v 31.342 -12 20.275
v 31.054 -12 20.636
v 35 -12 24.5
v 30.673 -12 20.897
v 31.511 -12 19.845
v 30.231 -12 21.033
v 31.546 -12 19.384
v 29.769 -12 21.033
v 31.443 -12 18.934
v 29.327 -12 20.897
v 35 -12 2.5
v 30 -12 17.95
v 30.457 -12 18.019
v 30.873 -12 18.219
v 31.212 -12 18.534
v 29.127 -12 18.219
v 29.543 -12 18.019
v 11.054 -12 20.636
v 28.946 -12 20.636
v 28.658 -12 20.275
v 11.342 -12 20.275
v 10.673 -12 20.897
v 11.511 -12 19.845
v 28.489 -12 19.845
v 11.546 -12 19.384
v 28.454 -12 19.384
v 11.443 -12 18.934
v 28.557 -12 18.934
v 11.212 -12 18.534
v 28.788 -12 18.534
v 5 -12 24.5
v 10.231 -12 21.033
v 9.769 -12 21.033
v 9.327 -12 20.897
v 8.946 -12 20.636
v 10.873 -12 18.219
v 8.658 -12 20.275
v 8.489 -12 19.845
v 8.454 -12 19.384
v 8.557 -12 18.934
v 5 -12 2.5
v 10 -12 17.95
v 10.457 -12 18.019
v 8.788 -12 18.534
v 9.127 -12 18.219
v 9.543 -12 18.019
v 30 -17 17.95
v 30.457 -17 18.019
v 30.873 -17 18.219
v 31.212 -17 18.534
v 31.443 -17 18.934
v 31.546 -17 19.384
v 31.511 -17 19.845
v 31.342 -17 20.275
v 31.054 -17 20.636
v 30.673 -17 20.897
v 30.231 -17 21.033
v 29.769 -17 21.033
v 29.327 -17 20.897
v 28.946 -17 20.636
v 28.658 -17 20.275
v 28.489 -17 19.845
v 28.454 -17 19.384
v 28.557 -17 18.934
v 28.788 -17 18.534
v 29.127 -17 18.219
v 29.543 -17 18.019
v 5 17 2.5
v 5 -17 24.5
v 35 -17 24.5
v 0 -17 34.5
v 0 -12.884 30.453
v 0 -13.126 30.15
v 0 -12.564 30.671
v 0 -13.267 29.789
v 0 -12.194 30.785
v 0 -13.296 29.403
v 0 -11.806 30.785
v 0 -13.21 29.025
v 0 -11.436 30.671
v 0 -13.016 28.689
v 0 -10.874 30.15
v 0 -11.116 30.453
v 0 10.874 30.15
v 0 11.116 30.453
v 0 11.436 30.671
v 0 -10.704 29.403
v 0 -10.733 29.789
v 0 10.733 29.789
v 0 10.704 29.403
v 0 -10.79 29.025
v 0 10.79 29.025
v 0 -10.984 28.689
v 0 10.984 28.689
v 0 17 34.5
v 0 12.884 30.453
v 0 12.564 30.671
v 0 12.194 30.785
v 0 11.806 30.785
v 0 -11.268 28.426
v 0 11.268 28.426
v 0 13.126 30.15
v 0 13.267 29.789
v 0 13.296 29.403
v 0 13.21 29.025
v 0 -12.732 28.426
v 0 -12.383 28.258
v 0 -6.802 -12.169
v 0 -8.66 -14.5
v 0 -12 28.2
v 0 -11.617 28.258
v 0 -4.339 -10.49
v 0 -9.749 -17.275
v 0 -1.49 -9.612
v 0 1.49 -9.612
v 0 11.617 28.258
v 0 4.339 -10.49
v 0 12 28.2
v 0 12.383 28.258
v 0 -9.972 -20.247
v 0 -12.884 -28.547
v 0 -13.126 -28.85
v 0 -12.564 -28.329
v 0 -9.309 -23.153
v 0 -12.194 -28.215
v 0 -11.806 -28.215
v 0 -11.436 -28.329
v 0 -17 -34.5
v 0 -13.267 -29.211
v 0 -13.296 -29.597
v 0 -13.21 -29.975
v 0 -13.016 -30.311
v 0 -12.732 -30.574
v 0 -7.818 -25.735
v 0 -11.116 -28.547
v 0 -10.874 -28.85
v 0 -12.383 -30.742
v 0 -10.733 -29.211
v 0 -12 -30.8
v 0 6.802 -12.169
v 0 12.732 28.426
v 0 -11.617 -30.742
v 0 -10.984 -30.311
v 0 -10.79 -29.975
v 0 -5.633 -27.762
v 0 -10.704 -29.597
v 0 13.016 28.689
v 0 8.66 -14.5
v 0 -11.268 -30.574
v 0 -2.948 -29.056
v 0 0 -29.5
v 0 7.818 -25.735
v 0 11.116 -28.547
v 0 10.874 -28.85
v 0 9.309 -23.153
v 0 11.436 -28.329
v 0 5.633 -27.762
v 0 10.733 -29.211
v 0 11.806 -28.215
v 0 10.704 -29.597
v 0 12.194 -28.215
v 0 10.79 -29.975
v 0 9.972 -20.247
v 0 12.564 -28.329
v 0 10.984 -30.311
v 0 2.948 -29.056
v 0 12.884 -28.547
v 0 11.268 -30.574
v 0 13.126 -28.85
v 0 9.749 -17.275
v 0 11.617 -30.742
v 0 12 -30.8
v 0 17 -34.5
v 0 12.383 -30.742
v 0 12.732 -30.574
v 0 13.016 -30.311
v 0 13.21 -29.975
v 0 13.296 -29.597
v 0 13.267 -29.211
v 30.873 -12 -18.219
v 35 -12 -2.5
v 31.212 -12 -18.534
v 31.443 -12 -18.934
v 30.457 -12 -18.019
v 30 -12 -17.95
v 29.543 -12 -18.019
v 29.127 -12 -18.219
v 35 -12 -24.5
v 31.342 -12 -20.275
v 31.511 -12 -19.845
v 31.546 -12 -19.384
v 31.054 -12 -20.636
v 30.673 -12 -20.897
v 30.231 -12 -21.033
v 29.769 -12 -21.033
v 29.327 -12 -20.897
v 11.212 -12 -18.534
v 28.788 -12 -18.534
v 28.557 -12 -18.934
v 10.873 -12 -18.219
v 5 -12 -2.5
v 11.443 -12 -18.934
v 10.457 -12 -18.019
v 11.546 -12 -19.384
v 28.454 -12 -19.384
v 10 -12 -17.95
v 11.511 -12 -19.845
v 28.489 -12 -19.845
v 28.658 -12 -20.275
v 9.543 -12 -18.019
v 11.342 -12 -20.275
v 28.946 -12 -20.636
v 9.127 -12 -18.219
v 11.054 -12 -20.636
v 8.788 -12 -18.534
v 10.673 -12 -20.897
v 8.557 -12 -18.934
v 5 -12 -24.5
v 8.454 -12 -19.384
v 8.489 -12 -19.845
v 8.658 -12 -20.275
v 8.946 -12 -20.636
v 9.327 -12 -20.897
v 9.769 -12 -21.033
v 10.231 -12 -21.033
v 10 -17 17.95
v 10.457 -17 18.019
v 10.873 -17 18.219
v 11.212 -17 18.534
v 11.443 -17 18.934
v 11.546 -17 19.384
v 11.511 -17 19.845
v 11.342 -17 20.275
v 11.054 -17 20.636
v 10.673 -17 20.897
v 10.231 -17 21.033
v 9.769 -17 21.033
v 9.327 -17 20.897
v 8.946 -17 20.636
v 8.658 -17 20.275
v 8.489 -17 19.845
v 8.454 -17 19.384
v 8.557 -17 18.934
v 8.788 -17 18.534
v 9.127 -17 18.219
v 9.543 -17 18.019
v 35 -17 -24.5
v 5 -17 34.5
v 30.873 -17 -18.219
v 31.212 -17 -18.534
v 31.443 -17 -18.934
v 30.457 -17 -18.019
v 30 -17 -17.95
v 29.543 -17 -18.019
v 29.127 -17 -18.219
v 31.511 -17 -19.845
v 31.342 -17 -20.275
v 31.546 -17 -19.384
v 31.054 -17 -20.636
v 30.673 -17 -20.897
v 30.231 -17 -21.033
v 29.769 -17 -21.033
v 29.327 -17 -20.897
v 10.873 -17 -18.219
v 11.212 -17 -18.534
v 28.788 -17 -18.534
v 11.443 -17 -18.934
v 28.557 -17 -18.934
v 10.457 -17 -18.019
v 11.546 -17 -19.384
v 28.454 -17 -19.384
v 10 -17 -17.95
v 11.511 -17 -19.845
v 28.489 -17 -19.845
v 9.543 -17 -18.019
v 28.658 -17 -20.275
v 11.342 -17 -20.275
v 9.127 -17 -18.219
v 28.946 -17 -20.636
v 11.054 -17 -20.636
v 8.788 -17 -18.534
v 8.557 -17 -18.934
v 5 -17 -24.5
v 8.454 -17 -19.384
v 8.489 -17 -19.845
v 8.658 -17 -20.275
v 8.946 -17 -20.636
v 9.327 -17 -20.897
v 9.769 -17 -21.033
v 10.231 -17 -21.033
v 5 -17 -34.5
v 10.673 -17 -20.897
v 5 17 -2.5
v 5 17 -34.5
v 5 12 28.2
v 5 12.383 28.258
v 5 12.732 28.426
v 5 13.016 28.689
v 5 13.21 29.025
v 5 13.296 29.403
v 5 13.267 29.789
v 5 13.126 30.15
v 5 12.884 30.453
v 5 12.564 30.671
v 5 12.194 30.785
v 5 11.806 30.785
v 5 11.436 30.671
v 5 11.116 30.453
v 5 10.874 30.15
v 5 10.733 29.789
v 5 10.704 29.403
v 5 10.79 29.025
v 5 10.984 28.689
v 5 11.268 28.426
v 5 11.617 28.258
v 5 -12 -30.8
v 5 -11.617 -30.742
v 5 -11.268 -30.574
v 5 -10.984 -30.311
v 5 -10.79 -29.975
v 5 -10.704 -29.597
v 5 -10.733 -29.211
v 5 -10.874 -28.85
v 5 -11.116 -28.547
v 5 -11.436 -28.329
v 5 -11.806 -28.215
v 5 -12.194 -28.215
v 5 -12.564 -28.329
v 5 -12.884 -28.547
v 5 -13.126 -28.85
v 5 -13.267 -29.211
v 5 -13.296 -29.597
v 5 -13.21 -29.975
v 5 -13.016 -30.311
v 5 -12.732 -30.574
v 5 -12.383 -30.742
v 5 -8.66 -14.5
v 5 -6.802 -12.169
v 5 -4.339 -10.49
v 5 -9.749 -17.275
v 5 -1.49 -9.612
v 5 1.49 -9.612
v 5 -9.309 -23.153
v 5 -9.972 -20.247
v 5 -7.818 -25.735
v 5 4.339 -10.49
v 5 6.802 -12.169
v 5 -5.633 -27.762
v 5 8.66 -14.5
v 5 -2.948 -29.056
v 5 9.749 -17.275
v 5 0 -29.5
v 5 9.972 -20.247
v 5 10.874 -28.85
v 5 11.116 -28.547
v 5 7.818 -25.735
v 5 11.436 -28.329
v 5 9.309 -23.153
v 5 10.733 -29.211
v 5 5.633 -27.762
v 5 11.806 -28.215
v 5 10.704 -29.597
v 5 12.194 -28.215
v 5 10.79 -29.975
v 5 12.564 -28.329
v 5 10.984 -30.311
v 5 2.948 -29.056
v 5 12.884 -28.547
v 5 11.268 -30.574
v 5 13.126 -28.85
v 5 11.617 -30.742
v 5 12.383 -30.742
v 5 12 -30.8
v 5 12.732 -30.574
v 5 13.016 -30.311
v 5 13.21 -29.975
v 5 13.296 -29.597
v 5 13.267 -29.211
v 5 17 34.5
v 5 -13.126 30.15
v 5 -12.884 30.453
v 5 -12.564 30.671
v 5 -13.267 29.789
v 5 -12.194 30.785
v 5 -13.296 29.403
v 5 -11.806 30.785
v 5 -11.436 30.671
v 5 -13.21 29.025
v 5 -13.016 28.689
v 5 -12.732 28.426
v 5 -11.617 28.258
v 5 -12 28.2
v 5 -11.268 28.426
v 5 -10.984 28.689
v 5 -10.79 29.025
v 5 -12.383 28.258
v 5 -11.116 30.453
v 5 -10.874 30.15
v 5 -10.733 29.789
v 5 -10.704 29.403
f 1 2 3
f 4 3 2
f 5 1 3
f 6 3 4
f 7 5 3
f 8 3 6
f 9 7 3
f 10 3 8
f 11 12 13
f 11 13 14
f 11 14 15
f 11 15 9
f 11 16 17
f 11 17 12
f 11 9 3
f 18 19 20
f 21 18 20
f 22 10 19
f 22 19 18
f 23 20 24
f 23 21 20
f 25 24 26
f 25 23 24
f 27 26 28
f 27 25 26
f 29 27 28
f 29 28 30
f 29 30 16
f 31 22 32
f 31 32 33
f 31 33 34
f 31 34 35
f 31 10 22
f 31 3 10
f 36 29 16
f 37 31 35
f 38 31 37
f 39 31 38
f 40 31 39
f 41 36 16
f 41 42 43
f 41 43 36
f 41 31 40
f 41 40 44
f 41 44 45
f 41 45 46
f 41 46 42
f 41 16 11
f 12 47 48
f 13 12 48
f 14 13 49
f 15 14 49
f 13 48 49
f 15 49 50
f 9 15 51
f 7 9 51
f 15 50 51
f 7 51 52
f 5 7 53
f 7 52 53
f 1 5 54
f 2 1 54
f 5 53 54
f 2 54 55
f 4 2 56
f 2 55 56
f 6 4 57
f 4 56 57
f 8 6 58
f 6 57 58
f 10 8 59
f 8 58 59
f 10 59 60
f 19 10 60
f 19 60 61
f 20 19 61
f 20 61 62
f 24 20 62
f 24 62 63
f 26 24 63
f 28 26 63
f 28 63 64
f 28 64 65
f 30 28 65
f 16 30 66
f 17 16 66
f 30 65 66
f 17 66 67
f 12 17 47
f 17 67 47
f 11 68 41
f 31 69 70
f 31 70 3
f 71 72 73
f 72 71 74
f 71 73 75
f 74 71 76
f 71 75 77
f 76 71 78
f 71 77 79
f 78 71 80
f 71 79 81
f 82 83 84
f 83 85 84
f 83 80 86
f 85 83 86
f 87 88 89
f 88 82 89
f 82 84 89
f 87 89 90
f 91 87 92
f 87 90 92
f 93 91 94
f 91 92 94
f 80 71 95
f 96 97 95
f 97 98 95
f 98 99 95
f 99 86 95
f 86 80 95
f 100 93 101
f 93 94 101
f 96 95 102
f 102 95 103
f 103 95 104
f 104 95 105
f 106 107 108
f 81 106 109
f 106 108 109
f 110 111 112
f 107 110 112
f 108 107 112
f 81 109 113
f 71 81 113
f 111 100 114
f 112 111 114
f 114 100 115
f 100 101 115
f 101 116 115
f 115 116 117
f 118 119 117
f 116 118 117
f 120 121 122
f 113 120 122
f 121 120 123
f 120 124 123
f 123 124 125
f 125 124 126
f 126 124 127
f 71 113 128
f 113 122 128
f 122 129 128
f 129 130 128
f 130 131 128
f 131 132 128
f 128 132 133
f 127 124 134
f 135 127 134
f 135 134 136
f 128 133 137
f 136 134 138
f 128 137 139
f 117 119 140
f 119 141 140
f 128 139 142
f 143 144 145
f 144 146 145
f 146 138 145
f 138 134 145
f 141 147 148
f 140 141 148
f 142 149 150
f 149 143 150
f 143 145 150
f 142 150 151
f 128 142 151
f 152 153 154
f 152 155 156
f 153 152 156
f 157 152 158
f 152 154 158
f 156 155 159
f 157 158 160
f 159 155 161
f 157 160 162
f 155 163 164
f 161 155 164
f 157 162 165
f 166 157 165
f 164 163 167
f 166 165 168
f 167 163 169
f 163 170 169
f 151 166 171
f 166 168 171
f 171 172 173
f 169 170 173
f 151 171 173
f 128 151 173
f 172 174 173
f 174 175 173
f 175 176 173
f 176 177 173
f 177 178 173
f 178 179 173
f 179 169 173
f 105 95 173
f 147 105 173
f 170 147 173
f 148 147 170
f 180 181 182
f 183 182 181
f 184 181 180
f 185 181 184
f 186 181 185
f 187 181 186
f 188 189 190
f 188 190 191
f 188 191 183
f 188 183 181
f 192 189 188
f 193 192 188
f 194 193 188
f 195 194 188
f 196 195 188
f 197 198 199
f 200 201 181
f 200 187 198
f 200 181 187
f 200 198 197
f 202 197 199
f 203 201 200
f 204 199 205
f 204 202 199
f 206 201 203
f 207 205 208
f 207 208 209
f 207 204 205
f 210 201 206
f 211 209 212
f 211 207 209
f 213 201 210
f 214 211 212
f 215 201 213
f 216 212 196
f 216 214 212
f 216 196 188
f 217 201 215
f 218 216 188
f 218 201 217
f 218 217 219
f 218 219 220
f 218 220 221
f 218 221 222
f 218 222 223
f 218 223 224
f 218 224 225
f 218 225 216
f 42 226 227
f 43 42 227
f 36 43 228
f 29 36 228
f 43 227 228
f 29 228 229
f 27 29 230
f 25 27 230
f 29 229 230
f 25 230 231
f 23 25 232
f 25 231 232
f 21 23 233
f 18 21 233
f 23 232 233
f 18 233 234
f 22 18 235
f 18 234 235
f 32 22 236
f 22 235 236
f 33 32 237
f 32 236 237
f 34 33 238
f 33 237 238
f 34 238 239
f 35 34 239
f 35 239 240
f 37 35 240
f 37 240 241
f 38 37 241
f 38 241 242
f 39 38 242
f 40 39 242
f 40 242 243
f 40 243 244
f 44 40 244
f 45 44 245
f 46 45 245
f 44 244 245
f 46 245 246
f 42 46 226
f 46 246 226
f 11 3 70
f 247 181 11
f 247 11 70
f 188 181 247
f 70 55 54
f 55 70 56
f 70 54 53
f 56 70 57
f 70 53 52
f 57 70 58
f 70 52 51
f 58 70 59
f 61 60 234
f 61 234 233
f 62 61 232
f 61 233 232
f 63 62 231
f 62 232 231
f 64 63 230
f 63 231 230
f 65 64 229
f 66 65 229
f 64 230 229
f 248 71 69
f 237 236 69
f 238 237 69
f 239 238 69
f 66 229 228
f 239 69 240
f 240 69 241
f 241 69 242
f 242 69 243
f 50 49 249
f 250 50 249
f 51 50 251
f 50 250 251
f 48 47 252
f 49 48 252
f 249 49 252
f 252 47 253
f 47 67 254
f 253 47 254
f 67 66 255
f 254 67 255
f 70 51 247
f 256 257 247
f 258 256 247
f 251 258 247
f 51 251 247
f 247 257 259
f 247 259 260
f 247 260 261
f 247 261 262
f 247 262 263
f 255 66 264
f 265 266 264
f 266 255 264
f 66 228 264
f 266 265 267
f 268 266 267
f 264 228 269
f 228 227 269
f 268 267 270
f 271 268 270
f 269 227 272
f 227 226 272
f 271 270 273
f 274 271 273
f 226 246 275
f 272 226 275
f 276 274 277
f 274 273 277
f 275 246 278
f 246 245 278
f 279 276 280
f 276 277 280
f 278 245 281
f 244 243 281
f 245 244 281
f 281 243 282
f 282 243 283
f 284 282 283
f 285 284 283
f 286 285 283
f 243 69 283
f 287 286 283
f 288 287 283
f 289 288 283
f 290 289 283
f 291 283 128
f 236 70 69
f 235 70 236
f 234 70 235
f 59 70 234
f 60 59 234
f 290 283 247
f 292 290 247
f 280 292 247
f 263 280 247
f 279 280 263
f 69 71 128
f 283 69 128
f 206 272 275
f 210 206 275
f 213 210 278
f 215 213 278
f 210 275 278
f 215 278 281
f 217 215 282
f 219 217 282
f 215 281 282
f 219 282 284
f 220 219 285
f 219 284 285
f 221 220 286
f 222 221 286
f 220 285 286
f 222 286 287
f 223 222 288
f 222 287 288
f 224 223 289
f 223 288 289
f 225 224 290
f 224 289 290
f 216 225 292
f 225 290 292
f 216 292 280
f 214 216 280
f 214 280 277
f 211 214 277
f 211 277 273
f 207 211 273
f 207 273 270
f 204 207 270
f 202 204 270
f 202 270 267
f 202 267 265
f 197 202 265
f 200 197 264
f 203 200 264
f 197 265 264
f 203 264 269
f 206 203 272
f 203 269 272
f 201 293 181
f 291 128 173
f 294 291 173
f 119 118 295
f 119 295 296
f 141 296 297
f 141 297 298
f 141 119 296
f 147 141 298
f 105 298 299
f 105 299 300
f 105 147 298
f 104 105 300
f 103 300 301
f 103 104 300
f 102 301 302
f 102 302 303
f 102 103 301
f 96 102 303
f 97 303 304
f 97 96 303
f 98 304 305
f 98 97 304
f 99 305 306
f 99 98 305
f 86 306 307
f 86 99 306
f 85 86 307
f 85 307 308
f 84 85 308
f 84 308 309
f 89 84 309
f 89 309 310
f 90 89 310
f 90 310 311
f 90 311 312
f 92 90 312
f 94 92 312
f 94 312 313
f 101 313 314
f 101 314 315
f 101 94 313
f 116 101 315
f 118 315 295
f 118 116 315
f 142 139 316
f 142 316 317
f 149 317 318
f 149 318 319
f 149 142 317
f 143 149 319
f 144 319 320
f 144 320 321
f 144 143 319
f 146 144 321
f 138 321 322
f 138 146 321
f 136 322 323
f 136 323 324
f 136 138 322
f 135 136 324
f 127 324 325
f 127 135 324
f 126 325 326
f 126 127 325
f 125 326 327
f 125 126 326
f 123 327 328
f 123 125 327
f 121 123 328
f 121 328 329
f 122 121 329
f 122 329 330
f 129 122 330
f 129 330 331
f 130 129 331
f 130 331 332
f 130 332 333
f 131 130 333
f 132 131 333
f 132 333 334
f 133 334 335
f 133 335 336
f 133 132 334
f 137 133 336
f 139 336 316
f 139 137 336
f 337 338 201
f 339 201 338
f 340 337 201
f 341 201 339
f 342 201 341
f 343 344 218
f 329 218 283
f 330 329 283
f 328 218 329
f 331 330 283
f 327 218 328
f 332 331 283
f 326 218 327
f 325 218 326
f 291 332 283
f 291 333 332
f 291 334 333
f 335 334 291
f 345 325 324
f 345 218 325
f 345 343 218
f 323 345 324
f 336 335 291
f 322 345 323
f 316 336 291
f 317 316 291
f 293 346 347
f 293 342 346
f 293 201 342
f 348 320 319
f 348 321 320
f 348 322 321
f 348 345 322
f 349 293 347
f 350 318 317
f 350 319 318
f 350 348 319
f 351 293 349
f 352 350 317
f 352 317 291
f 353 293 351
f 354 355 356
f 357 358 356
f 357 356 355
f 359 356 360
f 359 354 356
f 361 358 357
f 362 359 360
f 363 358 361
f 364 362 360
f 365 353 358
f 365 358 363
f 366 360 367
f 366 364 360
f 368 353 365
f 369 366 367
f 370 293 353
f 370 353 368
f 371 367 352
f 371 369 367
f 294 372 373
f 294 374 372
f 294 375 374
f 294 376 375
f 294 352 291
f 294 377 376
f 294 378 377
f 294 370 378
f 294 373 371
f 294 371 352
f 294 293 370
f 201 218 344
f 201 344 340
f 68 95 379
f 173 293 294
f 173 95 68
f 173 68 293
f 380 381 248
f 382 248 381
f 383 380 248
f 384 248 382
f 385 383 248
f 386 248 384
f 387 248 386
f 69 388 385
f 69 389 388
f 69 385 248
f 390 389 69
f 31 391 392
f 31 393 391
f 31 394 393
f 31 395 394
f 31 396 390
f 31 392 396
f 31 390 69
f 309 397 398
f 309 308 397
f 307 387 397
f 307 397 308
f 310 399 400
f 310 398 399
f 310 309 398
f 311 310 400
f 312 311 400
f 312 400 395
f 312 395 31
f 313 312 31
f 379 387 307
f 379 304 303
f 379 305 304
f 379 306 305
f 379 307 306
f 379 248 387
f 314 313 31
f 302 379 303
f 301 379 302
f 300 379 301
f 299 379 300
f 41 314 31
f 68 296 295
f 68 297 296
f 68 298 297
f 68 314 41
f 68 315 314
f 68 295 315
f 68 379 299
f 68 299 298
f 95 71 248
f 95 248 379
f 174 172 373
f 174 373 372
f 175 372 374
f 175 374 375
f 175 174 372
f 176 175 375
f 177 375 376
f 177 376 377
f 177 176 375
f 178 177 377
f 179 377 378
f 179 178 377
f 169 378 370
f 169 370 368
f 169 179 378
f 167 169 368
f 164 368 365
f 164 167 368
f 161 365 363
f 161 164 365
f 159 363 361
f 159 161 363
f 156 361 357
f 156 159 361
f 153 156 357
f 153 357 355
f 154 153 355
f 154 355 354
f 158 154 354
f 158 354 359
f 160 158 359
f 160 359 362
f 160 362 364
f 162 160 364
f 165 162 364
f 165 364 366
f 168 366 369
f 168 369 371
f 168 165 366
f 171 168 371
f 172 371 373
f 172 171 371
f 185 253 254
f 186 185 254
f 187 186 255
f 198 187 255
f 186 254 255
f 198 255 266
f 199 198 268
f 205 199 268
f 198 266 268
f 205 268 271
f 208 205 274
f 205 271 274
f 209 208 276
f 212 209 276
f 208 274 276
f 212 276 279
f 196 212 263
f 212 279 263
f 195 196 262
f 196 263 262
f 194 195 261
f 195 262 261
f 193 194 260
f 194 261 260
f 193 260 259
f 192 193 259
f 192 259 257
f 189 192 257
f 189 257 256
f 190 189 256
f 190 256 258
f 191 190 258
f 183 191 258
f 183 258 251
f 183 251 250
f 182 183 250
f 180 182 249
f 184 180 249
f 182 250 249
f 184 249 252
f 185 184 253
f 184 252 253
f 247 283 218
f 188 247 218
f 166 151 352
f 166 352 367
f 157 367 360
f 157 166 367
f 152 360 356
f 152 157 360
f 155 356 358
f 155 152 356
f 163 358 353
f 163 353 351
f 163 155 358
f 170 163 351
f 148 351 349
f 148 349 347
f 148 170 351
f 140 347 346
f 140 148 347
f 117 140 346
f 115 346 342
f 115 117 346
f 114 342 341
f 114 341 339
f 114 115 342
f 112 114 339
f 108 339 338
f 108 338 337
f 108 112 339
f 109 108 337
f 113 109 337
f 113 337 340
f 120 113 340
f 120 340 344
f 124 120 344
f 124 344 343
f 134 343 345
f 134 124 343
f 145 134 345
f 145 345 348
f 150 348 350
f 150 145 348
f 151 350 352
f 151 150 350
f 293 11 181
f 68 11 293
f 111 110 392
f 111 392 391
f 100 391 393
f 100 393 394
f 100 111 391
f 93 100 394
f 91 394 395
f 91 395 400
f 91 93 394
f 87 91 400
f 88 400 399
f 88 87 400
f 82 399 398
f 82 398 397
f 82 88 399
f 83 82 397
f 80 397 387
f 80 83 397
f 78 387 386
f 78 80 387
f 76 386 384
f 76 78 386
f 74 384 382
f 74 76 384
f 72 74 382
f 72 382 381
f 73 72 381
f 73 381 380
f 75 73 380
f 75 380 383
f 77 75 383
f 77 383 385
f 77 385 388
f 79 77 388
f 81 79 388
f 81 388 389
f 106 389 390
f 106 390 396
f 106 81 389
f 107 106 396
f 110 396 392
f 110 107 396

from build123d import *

# Parameters (mm, degrees)
SKETCH1_W           = 69
SKETCH1_H           = 34
SKETCH1_R           = 1.3
SKETCH1_R_2         = 10
BOSS_EXTRUDE1_DEPTH = 5
SKETCH2_W           = 49
SKETCH2_H           = 5
BOSS_EXTRUDE2_DEPTH = 30
BOSS_EXTRUDE3_DEPTH = 2.5
SKETCH4_R           = 1.55
CUT_EXTRUDE1_DEPTH  = 5


with BuildPart() as part:
    # Sketch1 → Boss-Extrude1 (new body)
    with BuildSketch(Plane(origin=(0, 0, 0), x_dir=(0, 0, -1), z_dir=(1, 0, 0))):
        Rectangle(SKETCH1_W, SKETCH1_H)
        with Locations((-29.5, 12)):
            Circle(SKETCH1_R, mode=Mode.SUBTRACT)
        with Locations((-29.5, -12)):
            Circle(SKETCH1_R, mode=Mode.SUBTRACT)
        with Locations((29.5, 12)):
            Circle(SKETCH1_R, mode=Mode.SUBTRACT)
        with Locations((29.5, -12)):
            Circle(SKETCH1_R, mode=Mode.SUBTRACT)
        with Locations((19.5, 0)):
            Circle(SKETCH1_R_2, mode=Mode.SUBTRACT)
    extrude(amount=BOSS_EXTRUDE1_DEPTH)

    # Sketch2 → Boss-Extrude2 (add)
    with BuildSketch(Plane(origin=(5, 0, 0), x_dir=(0, 0, -1), z_dir=(1, 0, 0))):
        with Locations((0, -14.5)):
            Rectangle(SKETCH2_W, SKETCH2_H)
    extrude(amount=BOSS_EXTRUDE2_DEPTH)

    # Sketch3 → Boss-Extrude3 (add, symmetric)
    with BuildSketch(Plane.XY):
        Polygon((5, -12), (35, -12), (5, 17), align=None)
    extrude(amount=BOSS_EXTRUDE3_DEPTH, both=True)

    # Sketch4 → Cut-Extrude1 (cut)
    with BuildSketch(Plane.XZ.offset(17)):
        with Locations(Location((30, 19.5, 0), (0, 0, 270))):
            Circle(SKETCH4_R)
        with Locations(Location((10, 19.5, 0), (0, 0, 270))):
            Circle(SKETCH4_R)
        with Locations(Location((10, -19.5, 0), (0, 0, 90))):
            Circle(SKETCH4_R)
        with Locations(Location((30, -19.5, 0), (0, 0, 90))):
            Circle(SKETCH4_R)
    extrude(amount=-CUT_EXTRUDE1_DEPTH, mode=Mode.SUBTRACT)


solid = part.part
